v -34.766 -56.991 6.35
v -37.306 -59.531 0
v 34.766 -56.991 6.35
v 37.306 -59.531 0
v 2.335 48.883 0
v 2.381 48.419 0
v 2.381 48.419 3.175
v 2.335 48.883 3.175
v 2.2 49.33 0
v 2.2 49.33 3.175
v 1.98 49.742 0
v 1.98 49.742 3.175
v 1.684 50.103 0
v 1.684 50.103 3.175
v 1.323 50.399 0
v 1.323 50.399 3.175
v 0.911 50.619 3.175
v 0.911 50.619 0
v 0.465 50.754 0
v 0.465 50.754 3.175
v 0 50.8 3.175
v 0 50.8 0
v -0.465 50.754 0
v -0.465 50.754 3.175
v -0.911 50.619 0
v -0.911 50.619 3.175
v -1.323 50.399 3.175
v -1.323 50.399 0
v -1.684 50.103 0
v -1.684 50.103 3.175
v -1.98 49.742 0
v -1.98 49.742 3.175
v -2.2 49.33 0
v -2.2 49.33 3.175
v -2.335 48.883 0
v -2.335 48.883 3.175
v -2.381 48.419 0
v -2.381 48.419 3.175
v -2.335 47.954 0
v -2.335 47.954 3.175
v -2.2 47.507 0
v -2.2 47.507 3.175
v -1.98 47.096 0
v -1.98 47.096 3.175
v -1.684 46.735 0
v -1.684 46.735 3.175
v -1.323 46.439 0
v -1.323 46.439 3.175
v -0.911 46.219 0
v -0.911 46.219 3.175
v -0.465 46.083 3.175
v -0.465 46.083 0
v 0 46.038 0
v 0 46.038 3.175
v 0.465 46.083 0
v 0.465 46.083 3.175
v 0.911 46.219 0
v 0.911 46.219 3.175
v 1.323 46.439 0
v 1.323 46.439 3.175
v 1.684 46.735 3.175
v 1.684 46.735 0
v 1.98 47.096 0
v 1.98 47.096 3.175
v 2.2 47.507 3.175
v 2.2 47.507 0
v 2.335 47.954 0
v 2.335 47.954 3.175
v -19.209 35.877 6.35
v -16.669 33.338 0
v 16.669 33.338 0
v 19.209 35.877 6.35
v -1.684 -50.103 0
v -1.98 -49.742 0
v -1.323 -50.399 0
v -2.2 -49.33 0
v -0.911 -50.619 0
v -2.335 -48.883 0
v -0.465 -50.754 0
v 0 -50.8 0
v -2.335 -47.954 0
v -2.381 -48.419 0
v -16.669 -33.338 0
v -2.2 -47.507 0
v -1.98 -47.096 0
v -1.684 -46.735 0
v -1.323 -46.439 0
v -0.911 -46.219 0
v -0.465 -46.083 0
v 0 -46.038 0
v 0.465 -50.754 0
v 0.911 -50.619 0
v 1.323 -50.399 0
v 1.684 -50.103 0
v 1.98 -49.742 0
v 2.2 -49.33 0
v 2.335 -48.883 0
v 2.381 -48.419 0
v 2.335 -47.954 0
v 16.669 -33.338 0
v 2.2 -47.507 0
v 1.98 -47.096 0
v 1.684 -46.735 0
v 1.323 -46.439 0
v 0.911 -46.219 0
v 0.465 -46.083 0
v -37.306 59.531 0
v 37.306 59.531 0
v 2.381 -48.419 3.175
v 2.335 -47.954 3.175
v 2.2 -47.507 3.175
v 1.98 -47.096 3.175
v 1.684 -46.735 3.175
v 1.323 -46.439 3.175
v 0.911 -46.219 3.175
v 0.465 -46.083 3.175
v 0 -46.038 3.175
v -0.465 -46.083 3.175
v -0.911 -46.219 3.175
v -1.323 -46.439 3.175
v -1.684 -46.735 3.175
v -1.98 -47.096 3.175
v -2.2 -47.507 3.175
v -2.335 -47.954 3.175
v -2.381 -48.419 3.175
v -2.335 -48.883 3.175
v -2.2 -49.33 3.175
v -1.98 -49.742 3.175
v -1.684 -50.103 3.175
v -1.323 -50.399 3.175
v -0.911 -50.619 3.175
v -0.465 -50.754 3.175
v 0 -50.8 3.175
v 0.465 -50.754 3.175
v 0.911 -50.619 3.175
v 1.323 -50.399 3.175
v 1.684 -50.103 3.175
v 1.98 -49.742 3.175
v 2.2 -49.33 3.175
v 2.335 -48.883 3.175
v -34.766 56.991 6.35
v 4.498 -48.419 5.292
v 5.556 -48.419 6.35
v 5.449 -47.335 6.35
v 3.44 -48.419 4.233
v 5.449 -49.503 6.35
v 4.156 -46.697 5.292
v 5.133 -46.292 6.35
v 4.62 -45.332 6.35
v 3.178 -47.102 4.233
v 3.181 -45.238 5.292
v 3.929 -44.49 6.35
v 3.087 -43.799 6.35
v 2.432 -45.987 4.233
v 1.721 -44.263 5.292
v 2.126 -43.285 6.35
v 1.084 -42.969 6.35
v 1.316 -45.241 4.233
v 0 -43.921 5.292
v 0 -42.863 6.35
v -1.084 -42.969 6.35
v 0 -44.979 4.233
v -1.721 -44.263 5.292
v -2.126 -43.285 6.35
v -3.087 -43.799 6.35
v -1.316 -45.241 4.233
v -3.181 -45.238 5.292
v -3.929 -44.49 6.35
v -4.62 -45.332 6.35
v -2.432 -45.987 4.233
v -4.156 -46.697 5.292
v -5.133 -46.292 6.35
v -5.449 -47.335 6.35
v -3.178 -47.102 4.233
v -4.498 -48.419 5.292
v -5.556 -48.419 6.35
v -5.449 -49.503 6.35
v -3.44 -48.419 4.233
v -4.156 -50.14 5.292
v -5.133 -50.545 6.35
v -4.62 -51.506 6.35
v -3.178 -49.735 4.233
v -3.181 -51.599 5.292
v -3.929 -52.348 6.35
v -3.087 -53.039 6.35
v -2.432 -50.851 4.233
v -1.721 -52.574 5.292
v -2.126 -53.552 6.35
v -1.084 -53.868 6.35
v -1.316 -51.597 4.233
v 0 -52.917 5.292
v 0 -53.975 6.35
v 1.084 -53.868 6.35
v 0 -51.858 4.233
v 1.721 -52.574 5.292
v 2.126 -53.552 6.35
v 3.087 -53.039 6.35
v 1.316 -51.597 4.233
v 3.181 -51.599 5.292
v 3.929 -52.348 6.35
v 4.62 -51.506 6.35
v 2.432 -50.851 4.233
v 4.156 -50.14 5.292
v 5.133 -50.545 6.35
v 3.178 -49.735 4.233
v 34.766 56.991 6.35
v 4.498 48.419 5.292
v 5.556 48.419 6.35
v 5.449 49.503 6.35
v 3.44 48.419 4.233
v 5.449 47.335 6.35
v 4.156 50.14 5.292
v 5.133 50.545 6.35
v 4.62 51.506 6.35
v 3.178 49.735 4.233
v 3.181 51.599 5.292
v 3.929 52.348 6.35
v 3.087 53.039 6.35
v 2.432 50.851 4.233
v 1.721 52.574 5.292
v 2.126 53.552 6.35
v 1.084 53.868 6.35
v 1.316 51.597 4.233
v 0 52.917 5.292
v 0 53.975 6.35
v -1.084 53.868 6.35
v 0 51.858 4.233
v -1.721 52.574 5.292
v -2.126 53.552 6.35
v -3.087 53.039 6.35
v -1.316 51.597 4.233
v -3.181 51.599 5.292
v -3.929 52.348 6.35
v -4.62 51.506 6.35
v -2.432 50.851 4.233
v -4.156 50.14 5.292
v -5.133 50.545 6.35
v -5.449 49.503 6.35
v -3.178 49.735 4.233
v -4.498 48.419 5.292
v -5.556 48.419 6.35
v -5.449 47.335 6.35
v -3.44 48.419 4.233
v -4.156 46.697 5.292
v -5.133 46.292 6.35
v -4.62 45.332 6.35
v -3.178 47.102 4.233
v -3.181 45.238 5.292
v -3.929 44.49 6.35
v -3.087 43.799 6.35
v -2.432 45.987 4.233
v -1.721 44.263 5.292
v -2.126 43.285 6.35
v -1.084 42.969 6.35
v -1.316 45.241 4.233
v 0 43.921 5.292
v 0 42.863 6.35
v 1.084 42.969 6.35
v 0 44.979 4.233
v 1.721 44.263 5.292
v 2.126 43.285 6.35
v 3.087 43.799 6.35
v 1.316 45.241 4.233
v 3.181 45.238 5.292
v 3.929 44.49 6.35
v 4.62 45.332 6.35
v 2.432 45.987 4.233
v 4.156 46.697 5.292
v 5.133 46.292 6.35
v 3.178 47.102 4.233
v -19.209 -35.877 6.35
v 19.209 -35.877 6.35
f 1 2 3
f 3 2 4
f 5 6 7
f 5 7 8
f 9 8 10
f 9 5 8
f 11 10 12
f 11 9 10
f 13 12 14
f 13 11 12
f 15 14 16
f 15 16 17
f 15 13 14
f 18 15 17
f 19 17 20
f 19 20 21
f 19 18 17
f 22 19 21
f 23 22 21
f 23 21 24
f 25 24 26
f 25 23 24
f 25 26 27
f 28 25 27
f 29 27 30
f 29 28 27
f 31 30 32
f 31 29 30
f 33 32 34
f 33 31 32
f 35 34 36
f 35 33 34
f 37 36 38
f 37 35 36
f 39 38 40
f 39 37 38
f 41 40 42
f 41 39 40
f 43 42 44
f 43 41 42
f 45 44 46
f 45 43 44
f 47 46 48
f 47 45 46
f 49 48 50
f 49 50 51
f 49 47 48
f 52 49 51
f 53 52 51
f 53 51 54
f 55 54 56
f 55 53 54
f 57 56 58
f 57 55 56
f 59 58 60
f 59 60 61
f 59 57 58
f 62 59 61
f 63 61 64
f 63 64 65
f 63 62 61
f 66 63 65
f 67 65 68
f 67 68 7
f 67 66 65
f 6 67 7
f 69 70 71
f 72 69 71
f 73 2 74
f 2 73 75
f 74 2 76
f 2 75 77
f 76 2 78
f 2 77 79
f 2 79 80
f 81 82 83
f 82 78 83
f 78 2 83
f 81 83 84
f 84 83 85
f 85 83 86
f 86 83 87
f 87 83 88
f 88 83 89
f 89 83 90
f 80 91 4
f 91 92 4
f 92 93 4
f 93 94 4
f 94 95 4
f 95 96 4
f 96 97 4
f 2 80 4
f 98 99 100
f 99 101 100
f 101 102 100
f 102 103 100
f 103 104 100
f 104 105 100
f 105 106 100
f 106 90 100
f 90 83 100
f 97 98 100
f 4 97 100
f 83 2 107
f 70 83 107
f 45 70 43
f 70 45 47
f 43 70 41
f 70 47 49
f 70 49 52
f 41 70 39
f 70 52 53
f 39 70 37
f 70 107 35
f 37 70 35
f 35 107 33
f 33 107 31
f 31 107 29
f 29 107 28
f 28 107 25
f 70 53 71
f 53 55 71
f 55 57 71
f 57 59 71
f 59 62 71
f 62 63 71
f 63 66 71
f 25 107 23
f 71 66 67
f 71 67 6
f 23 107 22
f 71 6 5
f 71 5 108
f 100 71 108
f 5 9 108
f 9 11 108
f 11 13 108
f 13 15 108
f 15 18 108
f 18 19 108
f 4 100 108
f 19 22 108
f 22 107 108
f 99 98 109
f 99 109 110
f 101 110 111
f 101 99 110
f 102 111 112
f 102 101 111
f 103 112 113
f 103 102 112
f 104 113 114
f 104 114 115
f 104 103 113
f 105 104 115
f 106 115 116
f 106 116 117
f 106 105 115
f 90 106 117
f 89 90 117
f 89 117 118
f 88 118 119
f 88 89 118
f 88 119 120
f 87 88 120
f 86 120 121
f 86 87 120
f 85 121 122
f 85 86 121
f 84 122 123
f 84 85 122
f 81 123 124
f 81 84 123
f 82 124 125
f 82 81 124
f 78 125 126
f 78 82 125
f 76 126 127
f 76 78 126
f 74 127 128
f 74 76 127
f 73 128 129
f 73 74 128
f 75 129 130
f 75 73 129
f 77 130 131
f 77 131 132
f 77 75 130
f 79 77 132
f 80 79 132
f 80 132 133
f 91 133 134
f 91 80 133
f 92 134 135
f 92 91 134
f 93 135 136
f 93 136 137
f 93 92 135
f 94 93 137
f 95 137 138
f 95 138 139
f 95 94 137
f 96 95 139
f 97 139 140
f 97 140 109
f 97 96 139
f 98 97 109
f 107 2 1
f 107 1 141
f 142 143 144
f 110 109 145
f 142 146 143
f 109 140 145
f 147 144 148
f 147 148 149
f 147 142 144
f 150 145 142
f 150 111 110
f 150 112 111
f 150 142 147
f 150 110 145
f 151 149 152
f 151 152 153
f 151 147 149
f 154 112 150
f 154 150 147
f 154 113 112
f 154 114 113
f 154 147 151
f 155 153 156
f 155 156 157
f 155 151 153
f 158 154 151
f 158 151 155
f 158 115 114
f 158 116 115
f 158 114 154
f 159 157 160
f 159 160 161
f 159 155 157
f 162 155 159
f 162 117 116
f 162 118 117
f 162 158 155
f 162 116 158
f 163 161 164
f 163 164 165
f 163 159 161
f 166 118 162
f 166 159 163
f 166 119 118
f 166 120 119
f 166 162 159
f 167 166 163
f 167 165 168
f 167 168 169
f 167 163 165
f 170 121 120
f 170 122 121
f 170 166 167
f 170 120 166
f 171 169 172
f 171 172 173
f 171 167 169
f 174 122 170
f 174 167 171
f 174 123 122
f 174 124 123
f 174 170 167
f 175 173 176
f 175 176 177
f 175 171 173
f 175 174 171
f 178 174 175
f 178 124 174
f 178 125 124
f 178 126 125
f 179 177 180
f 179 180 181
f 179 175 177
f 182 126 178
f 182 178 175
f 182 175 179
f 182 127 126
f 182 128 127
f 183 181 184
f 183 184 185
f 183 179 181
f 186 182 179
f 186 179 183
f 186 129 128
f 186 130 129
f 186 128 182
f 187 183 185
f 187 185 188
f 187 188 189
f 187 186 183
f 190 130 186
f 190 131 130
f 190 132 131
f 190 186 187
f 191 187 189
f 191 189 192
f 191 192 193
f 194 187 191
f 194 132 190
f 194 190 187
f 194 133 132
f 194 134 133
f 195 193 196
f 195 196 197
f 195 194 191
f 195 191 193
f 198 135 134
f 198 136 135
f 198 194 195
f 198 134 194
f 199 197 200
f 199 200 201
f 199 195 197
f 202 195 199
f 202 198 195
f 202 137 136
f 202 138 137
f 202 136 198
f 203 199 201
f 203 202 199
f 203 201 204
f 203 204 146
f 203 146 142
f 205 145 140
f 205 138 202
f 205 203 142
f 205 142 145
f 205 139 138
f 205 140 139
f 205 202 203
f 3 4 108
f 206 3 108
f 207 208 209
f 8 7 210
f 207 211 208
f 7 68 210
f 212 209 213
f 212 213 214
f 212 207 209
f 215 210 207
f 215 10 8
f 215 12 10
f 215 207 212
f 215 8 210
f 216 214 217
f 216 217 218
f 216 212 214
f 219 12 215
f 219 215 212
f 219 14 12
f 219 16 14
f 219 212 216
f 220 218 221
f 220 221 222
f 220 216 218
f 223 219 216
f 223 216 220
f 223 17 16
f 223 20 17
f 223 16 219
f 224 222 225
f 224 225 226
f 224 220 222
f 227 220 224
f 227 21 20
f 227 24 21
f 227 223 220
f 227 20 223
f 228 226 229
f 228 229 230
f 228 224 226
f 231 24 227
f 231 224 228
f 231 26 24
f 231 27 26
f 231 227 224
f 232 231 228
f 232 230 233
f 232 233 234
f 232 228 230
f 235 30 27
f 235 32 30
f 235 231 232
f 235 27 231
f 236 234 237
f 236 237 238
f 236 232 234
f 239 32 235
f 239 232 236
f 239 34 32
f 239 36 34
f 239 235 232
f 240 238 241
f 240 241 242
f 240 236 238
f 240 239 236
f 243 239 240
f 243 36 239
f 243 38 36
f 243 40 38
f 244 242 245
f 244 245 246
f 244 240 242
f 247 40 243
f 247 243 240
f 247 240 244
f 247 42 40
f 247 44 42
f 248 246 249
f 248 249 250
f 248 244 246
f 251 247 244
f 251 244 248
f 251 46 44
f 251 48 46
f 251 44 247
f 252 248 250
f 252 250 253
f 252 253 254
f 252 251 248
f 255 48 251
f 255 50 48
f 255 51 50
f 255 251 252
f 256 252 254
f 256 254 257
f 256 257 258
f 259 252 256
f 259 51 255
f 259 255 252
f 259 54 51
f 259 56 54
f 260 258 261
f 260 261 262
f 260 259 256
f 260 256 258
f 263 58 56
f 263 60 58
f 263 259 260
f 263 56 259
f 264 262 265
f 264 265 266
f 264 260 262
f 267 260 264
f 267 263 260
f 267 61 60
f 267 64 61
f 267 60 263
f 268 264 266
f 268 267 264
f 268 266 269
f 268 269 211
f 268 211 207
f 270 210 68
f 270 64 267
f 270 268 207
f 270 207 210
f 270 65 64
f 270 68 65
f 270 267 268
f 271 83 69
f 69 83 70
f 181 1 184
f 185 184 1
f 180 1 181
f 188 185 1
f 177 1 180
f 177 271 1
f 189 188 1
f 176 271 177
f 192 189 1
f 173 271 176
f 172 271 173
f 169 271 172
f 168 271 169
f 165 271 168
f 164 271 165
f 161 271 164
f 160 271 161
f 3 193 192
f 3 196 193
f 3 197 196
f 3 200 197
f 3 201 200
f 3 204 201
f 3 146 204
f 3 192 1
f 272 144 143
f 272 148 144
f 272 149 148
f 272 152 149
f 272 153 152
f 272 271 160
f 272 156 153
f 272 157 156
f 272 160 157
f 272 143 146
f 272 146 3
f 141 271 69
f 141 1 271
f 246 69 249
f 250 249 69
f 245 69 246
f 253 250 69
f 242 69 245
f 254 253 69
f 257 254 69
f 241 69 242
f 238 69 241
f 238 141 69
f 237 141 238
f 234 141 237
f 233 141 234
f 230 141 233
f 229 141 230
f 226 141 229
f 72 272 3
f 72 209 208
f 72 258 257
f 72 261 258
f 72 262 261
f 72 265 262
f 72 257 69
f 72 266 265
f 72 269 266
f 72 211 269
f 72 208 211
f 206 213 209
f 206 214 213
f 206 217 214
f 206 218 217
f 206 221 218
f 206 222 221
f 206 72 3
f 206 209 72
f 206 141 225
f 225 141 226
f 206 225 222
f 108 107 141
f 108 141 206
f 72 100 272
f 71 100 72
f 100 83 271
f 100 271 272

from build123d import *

# Parameters (mm, degrees)
F0_W     = 74.6125
F0_H     = 119.0625
F0_R     = 2.38125
F0_W_2   = 33.3375
F0_H_2   = 66.675
F1_DEPTH = 6.35
F2_SIZE2 = 6.34999
F2_SIZE  = 2.53999
F3_SIZE  = 3.175


# Not quite as in the source:
# - a fillet or chamfer is up to 0.001 mm smaller than in the source, because OpenCascade refuses the exact size


with BuildPart() as f1:
    # F0 (on Top) → F1 (new body)
    with BuildSketch(Plane.XY):
        Rectangle(F0_W, F0_H)
        with Locations((0, -48.41875)):
            Circle(F0_R, mode=Mode.SUBTRACT)
        Rectangle(F0_W_2, F0_H_2, mode=Mode.SUBTRACT)
        with Locations((0, 48.41875)):
            Circle(F0_R, mode=Mode.SUBTRACT)
    extrude(amount=F1_DEPTH)

    # F2 (size 2.54 and 6.35 in the source; OpenCascade refuses exactly that, so slightly less here)
    f2_edges = [f1.edges().sort_by_distance(p)[0] for p in [
        (-16.66875, 0, 6.35),
        (0, -33.3375, 6.35),
        (16.66875, 0, 6.35),
        (0, 33.3375, 6.35),
        (0, 59.53125, 6.35),
        (37.30625, 0, 6.35),
        (0, -59.53125, 6.35),
        (-37.30625, 0, 6.35),
    ]]
    f2_side = f1.faces().sort_by_distance((0, -58.126156, 6.35))[0]
    chamfer(f2_edges, length=F2_SIZE, length2=F2_SIZE2, reference=f2_side)

    # F3
    f3_edges = [f1.edges().sort_by_distance(p)[0] for p in [
        (-2.38125, -48.41875, 6.35),
        (-2.38125, 48.41875, 6.35),
    ]]
    chamfer(f3_edges, length=F3_SIZE)


solid = f1.part
